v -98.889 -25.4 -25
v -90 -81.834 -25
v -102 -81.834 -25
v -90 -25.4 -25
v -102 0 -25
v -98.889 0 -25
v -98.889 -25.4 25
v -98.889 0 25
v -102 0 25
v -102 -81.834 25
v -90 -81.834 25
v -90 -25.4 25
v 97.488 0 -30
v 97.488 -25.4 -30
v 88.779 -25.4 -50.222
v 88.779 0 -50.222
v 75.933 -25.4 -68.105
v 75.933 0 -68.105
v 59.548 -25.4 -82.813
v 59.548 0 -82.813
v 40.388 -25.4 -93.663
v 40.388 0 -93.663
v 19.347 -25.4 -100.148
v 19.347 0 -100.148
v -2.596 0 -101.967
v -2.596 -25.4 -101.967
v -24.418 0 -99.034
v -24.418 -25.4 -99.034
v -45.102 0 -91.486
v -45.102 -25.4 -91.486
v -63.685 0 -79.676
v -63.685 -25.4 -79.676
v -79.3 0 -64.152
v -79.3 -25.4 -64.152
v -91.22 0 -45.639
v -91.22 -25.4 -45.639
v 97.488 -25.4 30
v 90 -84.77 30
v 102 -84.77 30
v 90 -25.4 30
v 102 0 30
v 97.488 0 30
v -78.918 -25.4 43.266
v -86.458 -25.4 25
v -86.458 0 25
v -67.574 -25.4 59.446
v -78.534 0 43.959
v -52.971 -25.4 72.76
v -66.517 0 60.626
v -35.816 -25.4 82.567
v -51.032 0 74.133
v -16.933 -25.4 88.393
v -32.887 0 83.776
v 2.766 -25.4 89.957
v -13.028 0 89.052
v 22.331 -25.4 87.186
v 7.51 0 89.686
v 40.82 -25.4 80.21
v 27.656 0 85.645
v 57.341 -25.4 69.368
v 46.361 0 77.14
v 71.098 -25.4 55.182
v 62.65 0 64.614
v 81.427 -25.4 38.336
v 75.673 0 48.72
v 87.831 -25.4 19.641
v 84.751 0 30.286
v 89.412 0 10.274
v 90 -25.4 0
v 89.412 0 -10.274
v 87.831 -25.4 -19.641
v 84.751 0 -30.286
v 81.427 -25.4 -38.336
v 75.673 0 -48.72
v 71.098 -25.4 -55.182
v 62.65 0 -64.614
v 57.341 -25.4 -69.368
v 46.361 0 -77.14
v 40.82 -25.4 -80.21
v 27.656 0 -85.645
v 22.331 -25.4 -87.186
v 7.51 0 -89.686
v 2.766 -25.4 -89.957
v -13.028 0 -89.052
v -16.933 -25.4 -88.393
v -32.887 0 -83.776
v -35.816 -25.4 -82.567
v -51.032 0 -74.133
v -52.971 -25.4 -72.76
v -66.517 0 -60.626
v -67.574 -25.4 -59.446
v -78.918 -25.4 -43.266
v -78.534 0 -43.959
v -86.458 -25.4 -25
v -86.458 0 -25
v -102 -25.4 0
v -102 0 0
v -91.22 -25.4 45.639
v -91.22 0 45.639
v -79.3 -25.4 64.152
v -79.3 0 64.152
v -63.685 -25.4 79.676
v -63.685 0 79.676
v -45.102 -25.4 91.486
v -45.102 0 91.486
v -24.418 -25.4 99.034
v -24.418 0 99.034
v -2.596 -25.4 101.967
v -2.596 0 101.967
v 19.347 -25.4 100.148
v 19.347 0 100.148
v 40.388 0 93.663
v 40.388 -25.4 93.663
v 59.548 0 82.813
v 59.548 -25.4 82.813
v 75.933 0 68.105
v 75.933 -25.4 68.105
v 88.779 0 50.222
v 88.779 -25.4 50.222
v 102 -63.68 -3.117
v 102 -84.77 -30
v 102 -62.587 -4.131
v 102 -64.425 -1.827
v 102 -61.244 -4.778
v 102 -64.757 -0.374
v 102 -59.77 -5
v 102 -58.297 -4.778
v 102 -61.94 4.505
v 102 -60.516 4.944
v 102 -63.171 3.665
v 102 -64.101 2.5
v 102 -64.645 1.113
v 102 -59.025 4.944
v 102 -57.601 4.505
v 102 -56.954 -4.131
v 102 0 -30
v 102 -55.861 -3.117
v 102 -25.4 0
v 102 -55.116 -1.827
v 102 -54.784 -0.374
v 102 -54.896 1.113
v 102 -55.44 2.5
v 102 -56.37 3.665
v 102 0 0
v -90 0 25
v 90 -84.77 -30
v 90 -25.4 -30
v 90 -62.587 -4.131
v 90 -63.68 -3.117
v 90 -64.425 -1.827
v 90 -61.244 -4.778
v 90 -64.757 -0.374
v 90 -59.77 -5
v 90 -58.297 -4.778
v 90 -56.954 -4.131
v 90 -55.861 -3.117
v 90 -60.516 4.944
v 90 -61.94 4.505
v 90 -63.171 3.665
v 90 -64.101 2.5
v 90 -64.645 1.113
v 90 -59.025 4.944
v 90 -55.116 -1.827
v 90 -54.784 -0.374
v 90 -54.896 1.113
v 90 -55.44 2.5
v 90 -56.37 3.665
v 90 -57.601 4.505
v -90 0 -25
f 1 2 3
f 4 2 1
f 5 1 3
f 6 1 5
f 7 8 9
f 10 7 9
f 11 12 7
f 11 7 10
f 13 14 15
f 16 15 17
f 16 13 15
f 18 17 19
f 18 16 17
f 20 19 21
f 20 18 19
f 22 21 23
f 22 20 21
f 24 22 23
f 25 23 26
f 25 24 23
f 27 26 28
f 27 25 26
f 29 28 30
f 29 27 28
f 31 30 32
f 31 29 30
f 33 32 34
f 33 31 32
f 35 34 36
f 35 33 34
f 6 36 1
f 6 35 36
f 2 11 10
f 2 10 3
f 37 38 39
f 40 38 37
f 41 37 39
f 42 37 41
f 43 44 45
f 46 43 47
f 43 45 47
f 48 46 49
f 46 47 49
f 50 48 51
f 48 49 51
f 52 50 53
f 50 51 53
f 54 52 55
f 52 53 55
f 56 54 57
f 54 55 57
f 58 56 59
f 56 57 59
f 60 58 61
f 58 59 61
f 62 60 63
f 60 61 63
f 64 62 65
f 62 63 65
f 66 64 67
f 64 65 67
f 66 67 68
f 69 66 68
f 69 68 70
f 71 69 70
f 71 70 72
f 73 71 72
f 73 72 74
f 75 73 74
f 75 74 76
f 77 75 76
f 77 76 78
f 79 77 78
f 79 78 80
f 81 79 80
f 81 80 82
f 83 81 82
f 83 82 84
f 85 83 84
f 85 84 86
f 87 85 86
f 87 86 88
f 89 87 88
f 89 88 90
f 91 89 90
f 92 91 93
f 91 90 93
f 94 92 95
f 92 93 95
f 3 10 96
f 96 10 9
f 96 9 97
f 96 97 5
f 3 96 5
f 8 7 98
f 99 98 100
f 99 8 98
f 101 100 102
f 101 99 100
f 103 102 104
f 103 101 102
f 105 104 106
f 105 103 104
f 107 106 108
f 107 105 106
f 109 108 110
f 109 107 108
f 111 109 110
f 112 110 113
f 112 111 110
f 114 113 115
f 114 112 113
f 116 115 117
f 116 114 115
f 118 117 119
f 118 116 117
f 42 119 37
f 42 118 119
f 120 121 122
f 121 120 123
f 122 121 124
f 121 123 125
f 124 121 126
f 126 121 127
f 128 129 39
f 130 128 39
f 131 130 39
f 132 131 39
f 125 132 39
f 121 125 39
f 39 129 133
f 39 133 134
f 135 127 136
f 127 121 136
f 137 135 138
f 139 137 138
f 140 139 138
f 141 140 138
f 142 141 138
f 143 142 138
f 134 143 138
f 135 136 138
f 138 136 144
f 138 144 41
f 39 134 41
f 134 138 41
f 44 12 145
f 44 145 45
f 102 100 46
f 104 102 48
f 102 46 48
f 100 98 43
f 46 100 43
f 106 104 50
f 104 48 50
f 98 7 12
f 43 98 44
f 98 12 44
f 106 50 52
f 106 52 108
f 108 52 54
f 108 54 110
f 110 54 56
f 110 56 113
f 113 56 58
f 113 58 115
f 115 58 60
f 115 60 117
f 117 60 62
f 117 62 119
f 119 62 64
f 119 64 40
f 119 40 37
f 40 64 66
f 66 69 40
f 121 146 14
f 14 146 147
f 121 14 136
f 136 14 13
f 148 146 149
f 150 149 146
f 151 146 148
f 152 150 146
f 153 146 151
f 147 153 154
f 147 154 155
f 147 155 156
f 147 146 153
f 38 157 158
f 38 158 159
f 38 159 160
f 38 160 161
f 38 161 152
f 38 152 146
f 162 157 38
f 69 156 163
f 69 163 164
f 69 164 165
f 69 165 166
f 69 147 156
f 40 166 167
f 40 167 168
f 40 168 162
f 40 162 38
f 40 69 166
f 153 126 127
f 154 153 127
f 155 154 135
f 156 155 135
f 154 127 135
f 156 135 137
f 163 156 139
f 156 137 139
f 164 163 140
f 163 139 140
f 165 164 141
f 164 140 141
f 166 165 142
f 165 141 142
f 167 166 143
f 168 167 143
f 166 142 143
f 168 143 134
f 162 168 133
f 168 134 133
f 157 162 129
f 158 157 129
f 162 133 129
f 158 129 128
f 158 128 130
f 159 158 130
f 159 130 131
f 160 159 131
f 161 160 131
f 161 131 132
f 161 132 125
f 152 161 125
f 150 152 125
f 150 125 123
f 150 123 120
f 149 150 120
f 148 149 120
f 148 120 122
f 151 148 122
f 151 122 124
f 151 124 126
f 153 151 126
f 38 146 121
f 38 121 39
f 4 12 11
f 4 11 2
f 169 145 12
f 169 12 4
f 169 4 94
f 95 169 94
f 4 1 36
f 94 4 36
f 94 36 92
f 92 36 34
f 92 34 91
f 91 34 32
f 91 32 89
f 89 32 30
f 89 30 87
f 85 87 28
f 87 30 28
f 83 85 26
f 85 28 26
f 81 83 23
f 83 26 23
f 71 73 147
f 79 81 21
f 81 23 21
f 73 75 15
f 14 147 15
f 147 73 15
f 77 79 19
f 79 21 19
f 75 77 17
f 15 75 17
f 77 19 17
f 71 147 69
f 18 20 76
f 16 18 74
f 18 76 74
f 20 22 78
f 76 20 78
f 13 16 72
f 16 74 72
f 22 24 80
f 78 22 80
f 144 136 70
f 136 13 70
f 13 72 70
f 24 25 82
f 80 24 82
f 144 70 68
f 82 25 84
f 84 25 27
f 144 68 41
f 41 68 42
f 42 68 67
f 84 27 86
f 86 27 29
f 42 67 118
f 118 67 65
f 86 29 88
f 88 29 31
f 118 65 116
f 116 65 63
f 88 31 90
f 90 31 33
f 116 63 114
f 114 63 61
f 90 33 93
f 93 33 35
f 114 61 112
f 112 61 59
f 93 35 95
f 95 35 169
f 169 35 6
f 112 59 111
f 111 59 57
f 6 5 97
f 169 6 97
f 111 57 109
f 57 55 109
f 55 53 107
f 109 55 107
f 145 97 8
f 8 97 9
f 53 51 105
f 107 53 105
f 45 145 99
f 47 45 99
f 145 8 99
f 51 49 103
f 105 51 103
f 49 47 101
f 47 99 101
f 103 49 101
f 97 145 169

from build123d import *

# Parameters (mm, degrees)
SKETCH1_R                = 102
SKETCH1_R_2              = 90
BOSS_EXTRUDE1_DEPTH      = 25.4
BOSS_EXTRUDE4_DEPTH      = 12
SKETCH14_W               = 3.541917671
SKETCH14_H               = 50
CUT_EXTRUDE2_DEPTH       = 25.4
SKETCH8_W                = 60
SKETCH8_H                = 84.7705
BOSS_EXTRUDE5_DEPTH      = 12
M8_CLEARANCE_HOLE1_D     = 10
M8_CLEARANCE_HOLE1_DEPTH = 12


with BuildPart() as part:
    # Sketch1 → Boss-Extrude1 (new body)
    with BuildSketch(Plane(origin=(0, 0, 0), x_dir=(1, 0, 0), z_dir=(0, 1, 0))):
        Circle(SKETCH1_R)
        Circle(SKETCH1_R_2, mode=Mode.SUBTRACT)
    extrude(amount=-BOSS_EXTRUDE1_DEPTH)

    # Sketch7 → Boss-Extrude4 (add)
    with BuildSketch(Plane(origin=(-90, 0, 0), x_dir=(0, 0, -1), z_dir=(1, 0, 0))):
        Polygon((-25, -25.4), (-25, -81.8336), (25, -81.8336), (25, -25.4), (25, 0), (-25, 0), align=None)
    extrude(amount=-BOSS_EXTRUDE4_DEPTH)

    # Sketch14 → Cut-Extrude2 (cut)
    with BuildSketch(Plane.XZ.offset(25.4)):
        with Locations((-88.229041165, 0)):
            Rectangle(SKETCH14_W, SKETCH14_H)
    extrude(amount=-CUT_EXTRUDE2_DEPTH, mode=Mode.SUBTRACT)

    # Sketch8 → Boss-Extrude5 (add)
    with BuildSketch(Plane.ZY.offset(-90)):
        with Locations((0, -42.38525)):
            Rectangle(SKETCH8_W, SKETCH8_H)
    extrude(amount=-BOSS_EXTRUDE5_DEPTH)

    # M8 Clearance Hole1
    with Locations(Plane.ZY.offset(-90)):
        with Locations((0, -59.7705)):
            Hole(M8_CLEARANCE_HOLE1_D / 2, depth=M8_CLEARANCE_HOLE1_DEPTH)


solid = part.part
